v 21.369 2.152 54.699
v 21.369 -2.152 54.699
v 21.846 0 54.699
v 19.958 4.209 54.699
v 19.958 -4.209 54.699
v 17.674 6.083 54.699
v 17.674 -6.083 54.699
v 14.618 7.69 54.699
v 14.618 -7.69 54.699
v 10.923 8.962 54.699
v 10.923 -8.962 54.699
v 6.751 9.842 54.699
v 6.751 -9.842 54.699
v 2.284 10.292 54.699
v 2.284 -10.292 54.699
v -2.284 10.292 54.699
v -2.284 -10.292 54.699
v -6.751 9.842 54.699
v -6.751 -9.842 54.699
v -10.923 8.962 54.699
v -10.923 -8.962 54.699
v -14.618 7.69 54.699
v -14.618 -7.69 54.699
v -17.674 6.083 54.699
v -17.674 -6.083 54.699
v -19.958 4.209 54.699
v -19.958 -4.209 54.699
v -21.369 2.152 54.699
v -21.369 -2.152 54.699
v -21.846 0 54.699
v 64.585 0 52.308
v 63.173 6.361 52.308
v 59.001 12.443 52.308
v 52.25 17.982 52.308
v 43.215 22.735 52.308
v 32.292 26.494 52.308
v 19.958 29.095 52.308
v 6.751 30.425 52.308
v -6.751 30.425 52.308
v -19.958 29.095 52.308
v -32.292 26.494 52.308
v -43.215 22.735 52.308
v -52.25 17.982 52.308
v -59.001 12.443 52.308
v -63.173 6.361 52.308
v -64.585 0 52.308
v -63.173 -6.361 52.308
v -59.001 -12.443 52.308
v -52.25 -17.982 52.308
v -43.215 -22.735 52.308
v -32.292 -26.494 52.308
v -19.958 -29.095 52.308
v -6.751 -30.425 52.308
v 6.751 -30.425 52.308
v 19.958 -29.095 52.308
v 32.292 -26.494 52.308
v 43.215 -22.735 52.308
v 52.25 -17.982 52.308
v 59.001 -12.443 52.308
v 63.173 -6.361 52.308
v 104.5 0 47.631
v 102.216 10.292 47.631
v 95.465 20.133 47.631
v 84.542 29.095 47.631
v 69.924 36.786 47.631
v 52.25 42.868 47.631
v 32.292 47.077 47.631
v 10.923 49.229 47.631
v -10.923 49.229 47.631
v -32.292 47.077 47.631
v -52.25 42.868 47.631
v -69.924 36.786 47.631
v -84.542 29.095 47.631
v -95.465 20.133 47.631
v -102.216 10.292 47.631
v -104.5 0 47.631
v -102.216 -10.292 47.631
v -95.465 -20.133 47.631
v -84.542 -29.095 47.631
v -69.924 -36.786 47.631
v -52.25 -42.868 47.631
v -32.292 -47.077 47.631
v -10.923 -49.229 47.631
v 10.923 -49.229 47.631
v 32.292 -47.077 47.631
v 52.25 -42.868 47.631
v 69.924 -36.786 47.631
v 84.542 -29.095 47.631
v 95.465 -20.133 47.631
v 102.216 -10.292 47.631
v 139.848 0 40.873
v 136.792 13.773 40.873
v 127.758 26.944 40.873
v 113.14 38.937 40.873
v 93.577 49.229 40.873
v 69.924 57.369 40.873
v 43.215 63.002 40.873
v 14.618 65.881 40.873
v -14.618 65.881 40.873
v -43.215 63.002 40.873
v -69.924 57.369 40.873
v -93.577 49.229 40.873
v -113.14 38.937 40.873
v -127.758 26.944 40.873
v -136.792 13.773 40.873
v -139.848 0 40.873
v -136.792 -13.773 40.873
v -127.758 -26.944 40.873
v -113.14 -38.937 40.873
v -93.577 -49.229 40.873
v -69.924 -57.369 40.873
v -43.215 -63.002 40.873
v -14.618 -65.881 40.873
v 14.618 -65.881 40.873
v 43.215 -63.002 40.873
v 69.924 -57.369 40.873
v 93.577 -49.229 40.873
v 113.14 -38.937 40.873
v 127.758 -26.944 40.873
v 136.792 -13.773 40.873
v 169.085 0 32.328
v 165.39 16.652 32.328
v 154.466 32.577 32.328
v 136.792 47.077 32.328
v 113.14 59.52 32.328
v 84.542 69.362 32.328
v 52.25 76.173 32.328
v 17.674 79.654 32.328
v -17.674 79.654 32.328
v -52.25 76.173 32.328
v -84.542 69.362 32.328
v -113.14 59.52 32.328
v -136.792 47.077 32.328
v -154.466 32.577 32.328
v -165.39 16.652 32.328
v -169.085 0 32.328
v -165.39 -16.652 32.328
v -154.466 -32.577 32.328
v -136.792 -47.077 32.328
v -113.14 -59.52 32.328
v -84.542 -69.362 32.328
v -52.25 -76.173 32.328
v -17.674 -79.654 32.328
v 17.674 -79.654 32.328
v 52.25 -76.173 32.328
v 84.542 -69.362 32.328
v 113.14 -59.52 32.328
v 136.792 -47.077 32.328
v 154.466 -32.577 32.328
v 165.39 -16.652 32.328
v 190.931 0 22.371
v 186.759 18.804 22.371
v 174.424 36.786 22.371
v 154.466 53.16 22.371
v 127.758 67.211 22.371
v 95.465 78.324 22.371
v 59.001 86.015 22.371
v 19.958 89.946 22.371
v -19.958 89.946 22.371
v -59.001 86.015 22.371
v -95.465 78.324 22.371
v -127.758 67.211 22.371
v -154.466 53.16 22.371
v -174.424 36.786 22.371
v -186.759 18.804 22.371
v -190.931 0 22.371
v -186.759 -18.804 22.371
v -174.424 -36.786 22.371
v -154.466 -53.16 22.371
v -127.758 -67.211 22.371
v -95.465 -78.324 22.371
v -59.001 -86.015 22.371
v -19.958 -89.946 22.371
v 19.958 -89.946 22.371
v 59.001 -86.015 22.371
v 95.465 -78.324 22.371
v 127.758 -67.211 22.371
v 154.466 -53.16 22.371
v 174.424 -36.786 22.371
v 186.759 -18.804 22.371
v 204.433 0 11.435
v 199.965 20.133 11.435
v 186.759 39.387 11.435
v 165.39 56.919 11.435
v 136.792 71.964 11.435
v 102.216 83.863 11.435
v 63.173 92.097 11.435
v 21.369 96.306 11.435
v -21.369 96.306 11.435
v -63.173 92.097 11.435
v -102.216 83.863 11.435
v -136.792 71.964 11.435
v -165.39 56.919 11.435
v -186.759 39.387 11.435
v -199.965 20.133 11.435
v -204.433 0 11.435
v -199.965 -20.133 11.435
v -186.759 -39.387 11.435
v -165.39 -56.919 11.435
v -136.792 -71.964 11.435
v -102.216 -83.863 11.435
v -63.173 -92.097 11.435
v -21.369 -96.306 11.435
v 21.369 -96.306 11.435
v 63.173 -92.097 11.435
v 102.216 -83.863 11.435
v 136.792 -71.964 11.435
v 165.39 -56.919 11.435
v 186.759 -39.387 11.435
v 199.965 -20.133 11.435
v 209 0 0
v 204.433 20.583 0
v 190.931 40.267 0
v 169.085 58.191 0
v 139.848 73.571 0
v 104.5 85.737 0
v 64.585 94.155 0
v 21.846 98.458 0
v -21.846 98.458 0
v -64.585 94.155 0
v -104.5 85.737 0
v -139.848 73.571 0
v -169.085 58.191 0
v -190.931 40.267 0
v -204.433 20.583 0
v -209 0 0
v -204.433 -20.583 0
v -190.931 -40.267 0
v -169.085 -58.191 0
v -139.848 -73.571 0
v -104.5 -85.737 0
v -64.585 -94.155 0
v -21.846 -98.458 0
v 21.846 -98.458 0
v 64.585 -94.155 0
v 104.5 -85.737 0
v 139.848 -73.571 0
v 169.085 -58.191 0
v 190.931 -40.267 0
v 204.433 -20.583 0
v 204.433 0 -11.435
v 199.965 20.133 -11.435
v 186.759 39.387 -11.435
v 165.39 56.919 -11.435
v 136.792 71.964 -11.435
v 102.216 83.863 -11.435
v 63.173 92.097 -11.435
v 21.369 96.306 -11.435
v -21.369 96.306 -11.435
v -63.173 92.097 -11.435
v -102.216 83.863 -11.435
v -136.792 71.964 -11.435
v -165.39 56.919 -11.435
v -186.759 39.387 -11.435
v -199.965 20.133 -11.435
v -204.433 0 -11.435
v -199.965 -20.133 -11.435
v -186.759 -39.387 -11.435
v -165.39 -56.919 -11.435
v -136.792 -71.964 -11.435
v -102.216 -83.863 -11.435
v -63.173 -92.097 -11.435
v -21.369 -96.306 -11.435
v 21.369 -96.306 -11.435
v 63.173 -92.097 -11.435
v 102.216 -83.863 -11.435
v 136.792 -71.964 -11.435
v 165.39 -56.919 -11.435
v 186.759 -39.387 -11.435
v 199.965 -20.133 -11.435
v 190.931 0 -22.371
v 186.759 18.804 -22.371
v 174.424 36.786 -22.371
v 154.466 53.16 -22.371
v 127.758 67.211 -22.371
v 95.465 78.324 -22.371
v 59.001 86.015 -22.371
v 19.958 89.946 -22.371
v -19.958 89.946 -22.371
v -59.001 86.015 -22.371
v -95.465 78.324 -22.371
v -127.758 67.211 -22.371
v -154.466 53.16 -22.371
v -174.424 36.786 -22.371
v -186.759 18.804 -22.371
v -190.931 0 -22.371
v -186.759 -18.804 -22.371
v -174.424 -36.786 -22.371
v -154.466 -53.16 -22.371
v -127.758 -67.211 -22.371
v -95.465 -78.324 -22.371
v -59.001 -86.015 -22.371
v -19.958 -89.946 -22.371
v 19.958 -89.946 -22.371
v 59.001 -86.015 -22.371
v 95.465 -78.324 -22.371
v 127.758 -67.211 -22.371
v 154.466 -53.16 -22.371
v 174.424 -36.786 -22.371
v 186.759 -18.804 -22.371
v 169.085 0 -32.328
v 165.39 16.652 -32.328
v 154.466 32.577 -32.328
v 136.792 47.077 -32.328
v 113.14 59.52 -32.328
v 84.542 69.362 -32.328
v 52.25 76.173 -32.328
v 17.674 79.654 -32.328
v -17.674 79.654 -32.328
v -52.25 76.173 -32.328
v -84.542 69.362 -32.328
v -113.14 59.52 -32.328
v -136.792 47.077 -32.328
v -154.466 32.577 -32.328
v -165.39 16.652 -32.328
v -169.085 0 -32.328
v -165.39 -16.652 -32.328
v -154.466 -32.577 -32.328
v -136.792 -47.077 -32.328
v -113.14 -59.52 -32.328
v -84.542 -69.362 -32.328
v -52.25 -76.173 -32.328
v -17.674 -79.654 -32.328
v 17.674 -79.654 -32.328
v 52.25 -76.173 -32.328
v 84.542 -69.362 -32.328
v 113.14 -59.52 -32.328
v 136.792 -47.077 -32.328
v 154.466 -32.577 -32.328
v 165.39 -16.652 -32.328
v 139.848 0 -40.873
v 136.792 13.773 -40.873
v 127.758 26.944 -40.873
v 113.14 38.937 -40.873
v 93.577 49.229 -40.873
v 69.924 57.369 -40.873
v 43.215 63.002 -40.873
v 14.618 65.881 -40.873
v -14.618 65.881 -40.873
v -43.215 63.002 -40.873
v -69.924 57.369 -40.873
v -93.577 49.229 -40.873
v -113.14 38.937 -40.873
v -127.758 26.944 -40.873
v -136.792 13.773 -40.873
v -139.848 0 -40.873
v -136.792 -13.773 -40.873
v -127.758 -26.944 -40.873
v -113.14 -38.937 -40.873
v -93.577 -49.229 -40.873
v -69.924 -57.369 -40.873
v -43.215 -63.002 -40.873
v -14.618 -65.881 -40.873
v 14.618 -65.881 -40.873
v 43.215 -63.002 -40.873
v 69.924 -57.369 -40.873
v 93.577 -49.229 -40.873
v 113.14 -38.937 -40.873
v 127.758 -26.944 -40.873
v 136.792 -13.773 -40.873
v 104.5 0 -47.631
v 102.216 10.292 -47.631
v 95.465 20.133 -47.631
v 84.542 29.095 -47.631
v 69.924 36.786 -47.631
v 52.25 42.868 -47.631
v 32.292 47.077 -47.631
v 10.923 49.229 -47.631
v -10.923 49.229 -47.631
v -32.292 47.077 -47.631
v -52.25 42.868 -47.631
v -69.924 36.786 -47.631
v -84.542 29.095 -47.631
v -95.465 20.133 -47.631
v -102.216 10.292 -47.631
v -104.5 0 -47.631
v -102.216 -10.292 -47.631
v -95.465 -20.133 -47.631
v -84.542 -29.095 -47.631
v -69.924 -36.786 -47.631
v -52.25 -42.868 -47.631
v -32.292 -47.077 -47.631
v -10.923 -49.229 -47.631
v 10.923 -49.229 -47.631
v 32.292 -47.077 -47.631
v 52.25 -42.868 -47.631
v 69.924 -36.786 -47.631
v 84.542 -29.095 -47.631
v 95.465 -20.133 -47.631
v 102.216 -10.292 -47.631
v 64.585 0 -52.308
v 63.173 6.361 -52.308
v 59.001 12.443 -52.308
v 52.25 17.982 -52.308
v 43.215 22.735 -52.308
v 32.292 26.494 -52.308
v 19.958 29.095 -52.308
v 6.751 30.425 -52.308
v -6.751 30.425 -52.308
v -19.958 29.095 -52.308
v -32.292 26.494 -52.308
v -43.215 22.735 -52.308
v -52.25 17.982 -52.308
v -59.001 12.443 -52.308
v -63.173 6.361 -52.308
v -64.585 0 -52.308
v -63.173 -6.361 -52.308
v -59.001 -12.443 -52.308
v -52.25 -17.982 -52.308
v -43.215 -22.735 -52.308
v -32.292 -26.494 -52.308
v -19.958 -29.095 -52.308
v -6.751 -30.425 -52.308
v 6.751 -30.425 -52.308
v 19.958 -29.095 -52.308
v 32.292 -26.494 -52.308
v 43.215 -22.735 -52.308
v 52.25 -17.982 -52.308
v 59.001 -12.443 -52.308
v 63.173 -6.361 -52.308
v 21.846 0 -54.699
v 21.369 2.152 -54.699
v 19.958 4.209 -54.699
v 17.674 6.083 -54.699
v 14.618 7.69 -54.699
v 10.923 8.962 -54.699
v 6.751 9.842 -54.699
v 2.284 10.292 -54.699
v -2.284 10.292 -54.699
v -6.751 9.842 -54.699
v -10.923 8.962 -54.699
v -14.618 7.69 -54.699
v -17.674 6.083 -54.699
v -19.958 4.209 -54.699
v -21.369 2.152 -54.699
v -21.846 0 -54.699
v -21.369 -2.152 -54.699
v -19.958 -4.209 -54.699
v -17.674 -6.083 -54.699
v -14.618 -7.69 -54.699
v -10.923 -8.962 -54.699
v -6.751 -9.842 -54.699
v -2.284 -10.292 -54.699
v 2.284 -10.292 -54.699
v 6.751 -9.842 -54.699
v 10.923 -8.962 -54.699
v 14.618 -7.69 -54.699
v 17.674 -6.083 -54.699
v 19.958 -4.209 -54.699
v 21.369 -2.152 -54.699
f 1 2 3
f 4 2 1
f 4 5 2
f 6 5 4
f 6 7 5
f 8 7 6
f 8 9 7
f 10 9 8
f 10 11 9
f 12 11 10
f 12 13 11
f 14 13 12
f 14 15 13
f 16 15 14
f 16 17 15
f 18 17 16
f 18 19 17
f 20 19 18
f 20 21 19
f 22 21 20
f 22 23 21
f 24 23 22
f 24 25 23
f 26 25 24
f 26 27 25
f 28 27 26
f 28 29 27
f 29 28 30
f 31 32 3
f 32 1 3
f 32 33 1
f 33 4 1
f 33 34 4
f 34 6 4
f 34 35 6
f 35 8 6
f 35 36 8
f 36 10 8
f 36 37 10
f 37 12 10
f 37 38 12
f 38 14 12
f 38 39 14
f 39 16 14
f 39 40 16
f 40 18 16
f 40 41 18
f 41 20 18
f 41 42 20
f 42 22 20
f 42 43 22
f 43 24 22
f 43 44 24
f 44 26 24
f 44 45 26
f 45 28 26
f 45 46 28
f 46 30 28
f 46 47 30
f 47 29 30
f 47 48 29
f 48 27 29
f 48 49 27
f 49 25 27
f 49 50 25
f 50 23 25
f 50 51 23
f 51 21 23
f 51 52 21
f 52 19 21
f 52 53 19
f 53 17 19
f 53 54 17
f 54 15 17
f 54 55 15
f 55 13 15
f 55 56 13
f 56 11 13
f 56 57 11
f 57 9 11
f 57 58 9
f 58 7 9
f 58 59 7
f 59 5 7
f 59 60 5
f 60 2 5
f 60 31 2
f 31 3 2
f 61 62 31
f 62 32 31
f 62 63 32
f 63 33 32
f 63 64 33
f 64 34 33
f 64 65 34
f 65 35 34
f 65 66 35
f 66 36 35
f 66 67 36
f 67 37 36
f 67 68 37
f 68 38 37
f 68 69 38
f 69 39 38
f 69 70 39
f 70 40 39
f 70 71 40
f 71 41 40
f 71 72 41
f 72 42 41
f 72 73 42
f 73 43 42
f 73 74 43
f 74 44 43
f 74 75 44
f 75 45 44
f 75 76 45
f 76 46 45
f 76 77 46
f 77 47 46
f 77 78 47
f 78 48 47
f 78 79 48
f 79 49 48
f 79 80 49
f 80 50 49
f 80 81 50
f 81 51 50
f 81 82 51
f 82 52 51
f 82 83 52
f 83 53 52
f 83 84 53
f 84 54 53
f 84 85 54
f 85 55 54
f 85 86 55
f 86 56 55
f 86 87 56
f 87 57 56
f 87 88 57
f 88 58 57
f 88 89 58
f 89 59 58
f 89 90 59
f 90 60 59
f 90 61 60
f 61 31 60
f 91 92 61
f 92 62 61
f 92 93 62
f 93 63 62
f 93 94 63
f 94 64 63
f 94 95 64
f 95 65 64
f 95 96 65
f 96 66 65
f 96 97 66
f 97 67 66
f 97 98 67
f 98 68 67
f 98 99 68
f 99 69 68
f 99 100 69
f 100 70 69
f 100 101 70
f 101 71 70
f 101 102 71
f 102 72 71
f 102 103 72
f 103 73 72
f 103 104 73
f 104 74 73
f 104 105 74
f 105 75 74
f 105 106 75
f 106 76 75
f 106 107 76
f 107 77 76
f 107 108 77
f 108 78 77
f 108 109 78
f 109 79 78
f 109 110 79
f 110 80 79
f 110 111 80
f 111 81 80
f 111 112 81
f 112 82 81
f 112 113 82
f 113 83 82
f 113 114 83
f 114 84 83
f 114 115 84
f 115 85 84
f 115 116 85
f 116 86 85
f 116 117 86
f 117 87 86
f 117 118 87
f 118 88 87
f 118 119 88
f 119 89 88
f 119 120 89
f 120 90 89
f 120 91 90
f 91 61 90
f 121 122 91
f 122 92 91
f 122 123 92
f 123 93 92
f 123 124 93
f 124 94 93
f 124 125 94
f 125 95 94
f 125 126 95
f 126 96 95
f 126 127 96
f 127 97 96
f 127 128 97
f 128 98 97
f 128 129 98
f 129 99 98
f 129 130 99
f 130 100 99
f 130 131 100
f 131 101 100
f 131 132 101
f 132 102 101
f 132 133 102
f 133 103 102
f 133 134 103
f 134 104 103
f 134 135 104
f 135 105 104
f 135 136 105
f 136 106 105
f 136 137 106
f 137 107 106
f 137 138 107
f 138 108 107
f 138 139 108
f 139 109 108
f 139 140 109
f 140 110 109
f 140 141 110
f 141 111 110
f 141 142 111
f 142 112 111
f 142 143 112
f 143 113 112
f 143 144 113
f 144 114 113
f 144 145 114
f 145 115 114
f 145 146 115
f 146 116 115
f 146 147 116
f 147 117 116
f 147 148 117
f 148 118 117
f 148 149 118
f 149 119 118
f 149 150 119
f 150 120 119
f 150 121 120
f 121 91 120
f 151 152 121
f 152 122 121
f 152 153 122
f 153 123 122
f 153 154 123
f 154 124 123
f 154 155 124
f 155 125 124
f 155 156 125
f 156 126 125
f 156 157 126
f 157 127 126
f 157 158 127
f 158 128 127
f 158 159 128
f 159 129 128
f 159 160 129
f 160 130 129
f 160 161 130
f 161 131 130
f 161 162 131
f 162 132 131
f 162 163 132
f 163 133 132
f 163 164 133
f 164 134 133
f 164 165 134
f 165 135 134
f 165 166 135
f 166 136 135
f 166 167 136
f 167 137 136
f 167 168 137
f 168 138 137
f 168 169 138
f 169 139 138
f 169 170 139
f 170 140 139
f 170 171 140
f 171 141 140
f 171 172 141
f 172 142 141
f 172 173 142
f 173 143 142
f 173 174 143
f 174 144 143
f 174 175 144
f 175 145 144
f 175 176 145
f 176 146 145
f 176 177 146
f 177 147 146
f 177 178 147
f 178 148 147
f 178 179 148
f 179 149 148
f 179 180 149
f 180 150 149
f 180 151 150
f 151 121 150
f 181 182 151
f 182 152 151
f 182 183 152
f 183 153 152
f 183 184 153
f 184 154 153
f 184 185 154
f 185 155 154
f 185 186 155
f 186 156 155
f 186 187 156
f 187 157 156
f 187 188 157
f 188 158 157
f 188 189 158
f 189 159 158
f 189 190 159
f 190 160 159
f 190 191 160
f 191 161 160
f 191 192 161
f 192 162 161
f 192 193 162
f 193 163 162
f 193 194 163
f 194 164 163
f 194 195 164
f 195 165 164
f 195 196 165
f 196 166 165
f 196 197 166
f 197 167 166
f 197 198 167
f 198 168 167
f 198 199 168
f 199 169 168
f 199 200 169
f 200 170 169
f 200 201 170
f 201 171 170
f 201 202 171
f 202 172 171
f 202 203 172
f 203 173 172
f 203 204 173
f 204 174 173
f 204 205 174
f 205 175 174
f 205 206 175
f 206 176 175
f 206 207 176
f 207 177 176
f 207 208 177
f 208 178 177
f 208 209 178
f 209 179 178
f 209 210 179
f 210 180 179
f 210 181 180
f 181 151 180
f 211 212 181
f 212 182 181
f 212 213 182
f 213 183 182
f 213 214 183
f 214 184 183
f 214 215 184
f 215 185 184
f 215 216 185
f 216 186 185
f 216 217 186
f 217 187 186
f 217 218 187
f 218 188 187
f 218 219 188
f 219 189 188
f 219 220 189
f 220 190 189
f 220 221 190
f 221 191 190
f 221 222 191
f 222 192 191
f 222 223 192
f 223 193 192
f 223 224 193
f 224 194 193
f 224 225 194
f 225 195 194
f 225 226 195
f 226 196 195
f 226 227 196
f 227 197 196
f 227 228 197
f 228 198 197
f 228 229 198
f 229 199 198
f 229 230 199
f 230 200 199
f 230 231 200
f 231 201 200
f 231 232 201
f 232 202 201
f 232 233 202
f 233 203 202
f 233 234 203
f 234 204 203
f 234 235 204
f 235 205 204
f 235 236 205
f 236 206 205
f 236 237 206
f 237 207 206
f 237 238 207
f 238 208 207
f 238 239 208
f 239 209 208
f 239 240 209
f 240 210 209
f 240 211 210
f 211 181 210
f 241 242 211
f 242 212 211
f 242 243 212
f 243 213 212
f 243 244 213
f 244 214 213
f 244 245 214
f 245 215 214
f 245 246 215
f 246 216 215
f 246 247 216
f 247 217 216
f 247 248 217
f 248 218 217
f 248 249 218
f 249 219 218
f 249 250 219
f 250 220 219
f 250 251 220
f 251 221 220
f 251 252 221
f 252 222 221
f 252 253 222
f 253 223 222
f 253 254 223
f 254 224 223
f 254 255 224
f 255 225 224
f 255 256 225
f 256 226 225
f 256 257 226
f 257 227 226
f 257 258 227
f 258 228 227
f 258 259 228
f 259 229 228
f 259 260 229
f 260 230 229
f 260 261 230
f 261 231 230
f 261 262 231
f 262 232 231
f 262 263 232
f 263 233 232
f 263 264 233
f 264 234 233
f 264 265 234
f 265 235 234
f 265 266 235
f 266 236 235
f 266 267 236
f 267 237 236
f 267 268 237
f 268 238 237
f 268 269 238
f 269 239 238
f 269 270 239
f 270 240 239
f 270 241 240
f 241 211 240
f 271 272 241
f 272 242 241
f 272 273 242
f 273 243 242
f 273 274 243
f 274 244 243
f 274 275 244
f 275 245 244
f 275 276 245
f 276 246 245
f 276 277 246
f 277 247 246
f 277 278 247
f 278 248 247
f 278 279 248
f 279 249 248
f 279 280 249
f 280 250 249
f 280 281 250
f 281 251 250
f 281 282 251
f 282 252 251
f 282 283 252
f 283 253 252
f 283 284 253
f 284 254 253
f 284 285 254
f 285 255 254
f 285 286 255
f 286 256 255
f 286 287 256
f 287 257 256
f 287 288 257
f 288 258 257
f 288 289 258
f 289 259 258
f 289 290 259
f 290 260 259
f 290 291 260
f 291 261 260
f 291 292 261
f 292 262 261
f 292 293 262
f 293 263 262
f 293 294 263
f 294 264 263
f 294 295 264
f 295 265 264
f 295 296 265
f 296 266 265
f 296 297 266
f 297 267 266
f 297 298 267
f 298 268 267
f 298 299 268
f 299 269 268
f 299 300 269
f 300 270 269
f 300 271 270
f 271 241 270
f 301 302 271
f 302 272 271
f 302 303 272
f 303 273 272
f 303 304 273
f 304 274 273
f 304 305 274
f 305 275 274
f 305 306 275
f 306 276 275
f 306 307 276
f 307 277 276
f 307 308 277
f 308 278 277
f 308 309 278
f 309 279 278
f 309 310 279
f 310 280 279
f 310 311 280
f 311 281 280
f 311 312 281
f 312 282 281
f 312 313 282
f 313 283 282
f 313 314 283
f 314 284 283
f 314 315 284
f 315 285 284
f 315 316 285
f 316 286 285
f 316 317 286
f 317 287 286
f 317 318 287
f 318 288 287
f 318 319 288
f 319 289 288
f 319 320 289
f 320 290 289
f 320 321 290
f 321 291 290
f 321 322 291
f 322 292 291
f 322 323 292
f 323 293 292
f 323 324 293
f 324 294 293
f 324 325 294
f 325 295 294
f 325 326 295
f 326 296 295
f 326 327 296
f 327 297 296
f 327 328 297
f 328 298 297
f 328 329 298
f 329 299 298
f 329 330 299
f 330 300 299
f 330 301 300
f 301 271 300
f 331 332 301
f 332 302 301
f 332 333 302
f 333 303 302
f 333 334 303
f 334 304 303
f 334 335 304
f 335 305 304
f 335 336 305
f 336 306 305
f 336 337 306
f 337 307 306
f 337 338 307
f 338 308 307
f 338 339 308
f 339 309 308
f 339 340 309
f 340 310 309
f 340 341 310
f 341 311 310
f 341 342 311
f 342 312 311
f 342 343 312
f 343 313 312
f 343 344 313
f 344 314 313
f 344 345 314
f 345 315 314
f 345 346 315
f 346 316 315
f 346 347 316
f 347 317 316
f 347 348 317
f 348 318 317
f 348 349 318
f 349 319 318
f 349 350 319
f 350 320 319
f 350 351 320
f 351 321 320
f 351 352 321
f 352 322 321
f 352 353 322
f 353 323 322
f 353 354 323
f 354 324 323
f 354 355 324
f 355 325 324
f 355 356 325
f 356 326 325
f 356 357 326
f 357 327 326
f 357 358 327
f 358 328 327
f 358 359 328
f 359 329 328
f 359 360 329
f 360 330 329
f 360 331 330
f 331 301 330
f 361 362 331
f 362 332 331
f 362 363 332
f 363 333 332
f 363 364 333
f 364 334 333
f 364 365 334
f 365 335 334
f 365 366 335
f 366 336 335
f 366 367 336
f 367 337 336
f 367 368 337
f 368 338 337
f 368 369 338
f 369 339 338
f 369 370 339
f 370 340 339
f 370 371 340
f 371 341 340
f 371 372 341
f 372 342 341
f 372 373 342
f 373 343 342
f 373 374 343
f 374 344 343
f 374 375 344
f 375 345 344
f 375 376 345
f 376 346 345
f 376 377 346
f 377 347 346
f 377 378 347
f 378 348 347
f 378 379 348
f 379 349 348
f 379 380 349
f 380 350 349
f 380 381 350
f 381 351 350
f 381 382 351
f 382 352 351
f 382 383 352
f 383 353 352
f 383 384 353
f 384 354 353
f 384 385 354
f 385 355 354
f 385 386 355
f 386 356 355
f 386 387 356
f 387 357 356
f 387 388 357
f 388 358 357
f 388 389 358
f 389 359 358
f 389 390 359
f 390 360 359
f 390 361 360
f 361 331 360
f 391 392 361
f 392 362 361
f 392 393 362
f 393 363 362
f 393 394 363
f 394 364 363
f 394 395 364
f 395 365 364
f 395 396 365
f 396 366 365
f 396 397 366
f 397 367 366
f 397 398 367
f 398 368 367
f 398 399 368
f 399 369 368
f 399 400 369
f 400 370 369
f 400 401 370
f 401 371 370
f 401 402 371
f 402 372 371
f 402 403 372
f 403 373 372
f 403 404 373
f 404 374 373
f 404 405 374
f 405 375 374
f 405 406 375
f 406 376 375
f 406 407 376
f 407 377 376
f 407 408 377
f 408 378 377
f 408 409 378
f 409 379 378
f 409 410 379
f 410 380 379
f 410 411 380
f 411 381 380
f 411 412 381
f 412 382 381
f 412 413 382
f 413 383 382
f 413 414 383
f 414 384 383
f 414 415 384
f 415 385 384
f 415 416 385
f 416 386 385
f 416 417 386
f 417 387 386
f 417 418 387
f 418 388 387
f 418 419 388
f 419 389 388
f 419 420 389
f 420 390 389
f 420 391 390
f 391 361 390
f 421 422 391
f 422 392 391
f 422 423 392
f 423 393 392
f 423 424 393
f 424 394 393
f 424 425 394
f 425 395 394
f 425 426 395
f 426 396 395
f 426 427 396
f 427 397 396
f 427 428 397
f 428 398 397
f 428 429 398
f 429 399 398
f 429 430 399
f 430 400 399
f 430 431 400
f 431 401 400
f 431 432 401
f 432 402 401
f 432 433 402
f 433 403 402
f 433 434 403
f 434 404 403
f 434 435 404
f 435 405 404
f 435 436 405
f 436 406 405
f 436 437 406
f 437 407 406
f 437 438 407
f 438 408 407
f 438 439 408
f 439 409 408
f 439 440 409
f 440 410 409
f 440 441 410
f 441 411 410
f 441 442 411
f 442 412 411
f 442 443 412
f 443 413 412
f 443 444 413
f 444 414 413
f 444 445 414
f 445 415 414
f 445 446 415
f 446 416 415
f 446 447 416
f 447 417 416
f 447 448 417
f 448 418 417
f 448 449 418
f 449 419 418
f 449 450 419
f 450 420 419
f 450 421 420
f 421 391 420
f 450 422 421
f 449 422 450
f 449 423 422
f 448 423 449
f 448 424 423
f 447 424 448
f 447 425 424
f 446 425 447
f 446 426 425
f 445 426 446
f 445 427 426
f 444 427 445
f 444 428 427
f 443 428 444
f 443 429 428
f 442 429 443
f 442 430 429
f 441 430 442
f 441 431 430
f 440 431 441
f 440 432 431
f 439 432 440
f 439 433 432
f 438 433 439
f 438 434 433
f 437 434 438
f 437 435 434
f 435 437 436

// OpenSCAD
// Generated by SolidPython 1.0.1 on 2020-07-29 00:46:53


scale(v = [19, 9, 5]) {
	sphere(r = 11);
}
/***********************************************
*********      SolidPython code:      **********
************************************************
 
# import packages: SolidPython
from solid import *
from solid.utils import *
from itertools import chain, combinations, permutations


class Resize:

    def __init__(self, scad_file):
        self.scad_file = scad_file
        #self.scad_file = import_scad(scad_file)
        # cone/cylinder param:
        self.r1 = 0
        self.r2 = 0
        self.h = 0
        # rectangular prism param:
        self.w = 0
        self.l = 0
        # ellipse param:
        self.r = 0

    # import OpenScad code (file name corresponds to shape)


    # classify shape + parameters
    def assign(self, param1, param2, param3):
        if self.scad_file == 'cone.scad':
            self.r1 = param1
            self.r2 = param2
            self.h = param3
        elif self.scad_file == 'cylinder.scad':
            self.r1 = param1
            self.r2 = param2
            self.h = param3
        elif self.scad_file == 'rectangularPrism.scad':
            self.h = param1
            self.l = param2
            self.w = param3
        else:
            self.r = param1
            self.h = param2

    # resize parameters
    def iterate(self):
        x = range(3, 20, 2)
        i = 1
        if self.scad_file == 'cone.scad':
            tempList = list(permutations(x, 2))
            for temp in tempList:
                param1 = temp[0]
                param2 = temp[1]
                filepath = 'produced_scad_files/' + 'cone' + str(param1) + '_' + str(param2) + '_' + '.scad'
                scad_render_to_file(cylinder(h=param1, r1=param2, r2=0), filepath)

        elif self.scad_file == 'cylinder.scad':
            tempList = list(permutations(x, 3))
            for temp in tempList:
                param1 = temp[0]
                param2 = temp[1]
                filepath = 'produced_scad_files/' + 'cylinder' + str(param1) + '_' + str(param2) + '_' + '.scad'
                scad_render_to_file(cylinder(h=param1, r1=param2, r2=param2), filepath)

        elif self.scad_file == 'rectangularPrism.scad':
            tempList = list(permutations(x, 3))
            for temp in tempList:
                param1 = temp[0]
                param2 = temp[1]
                param3 = temp[2]
                filepath = 'produced_scad_files/' + 'rectangularPrism' + str(param1) + '_' + str(param2) + '_' + str(
                    param3) + '.scad'
                scad_render_to_file(cube(size=(param1, param2, param3)), filepath)

        elif self.scad_file == 'ellipse.scad':
            tempList = list(permutations(x, 4))
            for temp in tempList:
                param1 = temp[0]
                param2 = temp[1]
                param3 = temp[2]
                param4 = temp[3]
                filepath = 'produced_scad_files/' + 'ellipse' + str(param1) + '_' + str(param2) + '_' + str(param3) + '_' + str(param4) + '.scad'
                scad_render_to_file(scale([param1, param2, param3])(sphere(r=param4)), filepath)

    def render_to_scadfile(self):
        scad_render_to_file(scad, 'example.scad') 
 
************************************************/
